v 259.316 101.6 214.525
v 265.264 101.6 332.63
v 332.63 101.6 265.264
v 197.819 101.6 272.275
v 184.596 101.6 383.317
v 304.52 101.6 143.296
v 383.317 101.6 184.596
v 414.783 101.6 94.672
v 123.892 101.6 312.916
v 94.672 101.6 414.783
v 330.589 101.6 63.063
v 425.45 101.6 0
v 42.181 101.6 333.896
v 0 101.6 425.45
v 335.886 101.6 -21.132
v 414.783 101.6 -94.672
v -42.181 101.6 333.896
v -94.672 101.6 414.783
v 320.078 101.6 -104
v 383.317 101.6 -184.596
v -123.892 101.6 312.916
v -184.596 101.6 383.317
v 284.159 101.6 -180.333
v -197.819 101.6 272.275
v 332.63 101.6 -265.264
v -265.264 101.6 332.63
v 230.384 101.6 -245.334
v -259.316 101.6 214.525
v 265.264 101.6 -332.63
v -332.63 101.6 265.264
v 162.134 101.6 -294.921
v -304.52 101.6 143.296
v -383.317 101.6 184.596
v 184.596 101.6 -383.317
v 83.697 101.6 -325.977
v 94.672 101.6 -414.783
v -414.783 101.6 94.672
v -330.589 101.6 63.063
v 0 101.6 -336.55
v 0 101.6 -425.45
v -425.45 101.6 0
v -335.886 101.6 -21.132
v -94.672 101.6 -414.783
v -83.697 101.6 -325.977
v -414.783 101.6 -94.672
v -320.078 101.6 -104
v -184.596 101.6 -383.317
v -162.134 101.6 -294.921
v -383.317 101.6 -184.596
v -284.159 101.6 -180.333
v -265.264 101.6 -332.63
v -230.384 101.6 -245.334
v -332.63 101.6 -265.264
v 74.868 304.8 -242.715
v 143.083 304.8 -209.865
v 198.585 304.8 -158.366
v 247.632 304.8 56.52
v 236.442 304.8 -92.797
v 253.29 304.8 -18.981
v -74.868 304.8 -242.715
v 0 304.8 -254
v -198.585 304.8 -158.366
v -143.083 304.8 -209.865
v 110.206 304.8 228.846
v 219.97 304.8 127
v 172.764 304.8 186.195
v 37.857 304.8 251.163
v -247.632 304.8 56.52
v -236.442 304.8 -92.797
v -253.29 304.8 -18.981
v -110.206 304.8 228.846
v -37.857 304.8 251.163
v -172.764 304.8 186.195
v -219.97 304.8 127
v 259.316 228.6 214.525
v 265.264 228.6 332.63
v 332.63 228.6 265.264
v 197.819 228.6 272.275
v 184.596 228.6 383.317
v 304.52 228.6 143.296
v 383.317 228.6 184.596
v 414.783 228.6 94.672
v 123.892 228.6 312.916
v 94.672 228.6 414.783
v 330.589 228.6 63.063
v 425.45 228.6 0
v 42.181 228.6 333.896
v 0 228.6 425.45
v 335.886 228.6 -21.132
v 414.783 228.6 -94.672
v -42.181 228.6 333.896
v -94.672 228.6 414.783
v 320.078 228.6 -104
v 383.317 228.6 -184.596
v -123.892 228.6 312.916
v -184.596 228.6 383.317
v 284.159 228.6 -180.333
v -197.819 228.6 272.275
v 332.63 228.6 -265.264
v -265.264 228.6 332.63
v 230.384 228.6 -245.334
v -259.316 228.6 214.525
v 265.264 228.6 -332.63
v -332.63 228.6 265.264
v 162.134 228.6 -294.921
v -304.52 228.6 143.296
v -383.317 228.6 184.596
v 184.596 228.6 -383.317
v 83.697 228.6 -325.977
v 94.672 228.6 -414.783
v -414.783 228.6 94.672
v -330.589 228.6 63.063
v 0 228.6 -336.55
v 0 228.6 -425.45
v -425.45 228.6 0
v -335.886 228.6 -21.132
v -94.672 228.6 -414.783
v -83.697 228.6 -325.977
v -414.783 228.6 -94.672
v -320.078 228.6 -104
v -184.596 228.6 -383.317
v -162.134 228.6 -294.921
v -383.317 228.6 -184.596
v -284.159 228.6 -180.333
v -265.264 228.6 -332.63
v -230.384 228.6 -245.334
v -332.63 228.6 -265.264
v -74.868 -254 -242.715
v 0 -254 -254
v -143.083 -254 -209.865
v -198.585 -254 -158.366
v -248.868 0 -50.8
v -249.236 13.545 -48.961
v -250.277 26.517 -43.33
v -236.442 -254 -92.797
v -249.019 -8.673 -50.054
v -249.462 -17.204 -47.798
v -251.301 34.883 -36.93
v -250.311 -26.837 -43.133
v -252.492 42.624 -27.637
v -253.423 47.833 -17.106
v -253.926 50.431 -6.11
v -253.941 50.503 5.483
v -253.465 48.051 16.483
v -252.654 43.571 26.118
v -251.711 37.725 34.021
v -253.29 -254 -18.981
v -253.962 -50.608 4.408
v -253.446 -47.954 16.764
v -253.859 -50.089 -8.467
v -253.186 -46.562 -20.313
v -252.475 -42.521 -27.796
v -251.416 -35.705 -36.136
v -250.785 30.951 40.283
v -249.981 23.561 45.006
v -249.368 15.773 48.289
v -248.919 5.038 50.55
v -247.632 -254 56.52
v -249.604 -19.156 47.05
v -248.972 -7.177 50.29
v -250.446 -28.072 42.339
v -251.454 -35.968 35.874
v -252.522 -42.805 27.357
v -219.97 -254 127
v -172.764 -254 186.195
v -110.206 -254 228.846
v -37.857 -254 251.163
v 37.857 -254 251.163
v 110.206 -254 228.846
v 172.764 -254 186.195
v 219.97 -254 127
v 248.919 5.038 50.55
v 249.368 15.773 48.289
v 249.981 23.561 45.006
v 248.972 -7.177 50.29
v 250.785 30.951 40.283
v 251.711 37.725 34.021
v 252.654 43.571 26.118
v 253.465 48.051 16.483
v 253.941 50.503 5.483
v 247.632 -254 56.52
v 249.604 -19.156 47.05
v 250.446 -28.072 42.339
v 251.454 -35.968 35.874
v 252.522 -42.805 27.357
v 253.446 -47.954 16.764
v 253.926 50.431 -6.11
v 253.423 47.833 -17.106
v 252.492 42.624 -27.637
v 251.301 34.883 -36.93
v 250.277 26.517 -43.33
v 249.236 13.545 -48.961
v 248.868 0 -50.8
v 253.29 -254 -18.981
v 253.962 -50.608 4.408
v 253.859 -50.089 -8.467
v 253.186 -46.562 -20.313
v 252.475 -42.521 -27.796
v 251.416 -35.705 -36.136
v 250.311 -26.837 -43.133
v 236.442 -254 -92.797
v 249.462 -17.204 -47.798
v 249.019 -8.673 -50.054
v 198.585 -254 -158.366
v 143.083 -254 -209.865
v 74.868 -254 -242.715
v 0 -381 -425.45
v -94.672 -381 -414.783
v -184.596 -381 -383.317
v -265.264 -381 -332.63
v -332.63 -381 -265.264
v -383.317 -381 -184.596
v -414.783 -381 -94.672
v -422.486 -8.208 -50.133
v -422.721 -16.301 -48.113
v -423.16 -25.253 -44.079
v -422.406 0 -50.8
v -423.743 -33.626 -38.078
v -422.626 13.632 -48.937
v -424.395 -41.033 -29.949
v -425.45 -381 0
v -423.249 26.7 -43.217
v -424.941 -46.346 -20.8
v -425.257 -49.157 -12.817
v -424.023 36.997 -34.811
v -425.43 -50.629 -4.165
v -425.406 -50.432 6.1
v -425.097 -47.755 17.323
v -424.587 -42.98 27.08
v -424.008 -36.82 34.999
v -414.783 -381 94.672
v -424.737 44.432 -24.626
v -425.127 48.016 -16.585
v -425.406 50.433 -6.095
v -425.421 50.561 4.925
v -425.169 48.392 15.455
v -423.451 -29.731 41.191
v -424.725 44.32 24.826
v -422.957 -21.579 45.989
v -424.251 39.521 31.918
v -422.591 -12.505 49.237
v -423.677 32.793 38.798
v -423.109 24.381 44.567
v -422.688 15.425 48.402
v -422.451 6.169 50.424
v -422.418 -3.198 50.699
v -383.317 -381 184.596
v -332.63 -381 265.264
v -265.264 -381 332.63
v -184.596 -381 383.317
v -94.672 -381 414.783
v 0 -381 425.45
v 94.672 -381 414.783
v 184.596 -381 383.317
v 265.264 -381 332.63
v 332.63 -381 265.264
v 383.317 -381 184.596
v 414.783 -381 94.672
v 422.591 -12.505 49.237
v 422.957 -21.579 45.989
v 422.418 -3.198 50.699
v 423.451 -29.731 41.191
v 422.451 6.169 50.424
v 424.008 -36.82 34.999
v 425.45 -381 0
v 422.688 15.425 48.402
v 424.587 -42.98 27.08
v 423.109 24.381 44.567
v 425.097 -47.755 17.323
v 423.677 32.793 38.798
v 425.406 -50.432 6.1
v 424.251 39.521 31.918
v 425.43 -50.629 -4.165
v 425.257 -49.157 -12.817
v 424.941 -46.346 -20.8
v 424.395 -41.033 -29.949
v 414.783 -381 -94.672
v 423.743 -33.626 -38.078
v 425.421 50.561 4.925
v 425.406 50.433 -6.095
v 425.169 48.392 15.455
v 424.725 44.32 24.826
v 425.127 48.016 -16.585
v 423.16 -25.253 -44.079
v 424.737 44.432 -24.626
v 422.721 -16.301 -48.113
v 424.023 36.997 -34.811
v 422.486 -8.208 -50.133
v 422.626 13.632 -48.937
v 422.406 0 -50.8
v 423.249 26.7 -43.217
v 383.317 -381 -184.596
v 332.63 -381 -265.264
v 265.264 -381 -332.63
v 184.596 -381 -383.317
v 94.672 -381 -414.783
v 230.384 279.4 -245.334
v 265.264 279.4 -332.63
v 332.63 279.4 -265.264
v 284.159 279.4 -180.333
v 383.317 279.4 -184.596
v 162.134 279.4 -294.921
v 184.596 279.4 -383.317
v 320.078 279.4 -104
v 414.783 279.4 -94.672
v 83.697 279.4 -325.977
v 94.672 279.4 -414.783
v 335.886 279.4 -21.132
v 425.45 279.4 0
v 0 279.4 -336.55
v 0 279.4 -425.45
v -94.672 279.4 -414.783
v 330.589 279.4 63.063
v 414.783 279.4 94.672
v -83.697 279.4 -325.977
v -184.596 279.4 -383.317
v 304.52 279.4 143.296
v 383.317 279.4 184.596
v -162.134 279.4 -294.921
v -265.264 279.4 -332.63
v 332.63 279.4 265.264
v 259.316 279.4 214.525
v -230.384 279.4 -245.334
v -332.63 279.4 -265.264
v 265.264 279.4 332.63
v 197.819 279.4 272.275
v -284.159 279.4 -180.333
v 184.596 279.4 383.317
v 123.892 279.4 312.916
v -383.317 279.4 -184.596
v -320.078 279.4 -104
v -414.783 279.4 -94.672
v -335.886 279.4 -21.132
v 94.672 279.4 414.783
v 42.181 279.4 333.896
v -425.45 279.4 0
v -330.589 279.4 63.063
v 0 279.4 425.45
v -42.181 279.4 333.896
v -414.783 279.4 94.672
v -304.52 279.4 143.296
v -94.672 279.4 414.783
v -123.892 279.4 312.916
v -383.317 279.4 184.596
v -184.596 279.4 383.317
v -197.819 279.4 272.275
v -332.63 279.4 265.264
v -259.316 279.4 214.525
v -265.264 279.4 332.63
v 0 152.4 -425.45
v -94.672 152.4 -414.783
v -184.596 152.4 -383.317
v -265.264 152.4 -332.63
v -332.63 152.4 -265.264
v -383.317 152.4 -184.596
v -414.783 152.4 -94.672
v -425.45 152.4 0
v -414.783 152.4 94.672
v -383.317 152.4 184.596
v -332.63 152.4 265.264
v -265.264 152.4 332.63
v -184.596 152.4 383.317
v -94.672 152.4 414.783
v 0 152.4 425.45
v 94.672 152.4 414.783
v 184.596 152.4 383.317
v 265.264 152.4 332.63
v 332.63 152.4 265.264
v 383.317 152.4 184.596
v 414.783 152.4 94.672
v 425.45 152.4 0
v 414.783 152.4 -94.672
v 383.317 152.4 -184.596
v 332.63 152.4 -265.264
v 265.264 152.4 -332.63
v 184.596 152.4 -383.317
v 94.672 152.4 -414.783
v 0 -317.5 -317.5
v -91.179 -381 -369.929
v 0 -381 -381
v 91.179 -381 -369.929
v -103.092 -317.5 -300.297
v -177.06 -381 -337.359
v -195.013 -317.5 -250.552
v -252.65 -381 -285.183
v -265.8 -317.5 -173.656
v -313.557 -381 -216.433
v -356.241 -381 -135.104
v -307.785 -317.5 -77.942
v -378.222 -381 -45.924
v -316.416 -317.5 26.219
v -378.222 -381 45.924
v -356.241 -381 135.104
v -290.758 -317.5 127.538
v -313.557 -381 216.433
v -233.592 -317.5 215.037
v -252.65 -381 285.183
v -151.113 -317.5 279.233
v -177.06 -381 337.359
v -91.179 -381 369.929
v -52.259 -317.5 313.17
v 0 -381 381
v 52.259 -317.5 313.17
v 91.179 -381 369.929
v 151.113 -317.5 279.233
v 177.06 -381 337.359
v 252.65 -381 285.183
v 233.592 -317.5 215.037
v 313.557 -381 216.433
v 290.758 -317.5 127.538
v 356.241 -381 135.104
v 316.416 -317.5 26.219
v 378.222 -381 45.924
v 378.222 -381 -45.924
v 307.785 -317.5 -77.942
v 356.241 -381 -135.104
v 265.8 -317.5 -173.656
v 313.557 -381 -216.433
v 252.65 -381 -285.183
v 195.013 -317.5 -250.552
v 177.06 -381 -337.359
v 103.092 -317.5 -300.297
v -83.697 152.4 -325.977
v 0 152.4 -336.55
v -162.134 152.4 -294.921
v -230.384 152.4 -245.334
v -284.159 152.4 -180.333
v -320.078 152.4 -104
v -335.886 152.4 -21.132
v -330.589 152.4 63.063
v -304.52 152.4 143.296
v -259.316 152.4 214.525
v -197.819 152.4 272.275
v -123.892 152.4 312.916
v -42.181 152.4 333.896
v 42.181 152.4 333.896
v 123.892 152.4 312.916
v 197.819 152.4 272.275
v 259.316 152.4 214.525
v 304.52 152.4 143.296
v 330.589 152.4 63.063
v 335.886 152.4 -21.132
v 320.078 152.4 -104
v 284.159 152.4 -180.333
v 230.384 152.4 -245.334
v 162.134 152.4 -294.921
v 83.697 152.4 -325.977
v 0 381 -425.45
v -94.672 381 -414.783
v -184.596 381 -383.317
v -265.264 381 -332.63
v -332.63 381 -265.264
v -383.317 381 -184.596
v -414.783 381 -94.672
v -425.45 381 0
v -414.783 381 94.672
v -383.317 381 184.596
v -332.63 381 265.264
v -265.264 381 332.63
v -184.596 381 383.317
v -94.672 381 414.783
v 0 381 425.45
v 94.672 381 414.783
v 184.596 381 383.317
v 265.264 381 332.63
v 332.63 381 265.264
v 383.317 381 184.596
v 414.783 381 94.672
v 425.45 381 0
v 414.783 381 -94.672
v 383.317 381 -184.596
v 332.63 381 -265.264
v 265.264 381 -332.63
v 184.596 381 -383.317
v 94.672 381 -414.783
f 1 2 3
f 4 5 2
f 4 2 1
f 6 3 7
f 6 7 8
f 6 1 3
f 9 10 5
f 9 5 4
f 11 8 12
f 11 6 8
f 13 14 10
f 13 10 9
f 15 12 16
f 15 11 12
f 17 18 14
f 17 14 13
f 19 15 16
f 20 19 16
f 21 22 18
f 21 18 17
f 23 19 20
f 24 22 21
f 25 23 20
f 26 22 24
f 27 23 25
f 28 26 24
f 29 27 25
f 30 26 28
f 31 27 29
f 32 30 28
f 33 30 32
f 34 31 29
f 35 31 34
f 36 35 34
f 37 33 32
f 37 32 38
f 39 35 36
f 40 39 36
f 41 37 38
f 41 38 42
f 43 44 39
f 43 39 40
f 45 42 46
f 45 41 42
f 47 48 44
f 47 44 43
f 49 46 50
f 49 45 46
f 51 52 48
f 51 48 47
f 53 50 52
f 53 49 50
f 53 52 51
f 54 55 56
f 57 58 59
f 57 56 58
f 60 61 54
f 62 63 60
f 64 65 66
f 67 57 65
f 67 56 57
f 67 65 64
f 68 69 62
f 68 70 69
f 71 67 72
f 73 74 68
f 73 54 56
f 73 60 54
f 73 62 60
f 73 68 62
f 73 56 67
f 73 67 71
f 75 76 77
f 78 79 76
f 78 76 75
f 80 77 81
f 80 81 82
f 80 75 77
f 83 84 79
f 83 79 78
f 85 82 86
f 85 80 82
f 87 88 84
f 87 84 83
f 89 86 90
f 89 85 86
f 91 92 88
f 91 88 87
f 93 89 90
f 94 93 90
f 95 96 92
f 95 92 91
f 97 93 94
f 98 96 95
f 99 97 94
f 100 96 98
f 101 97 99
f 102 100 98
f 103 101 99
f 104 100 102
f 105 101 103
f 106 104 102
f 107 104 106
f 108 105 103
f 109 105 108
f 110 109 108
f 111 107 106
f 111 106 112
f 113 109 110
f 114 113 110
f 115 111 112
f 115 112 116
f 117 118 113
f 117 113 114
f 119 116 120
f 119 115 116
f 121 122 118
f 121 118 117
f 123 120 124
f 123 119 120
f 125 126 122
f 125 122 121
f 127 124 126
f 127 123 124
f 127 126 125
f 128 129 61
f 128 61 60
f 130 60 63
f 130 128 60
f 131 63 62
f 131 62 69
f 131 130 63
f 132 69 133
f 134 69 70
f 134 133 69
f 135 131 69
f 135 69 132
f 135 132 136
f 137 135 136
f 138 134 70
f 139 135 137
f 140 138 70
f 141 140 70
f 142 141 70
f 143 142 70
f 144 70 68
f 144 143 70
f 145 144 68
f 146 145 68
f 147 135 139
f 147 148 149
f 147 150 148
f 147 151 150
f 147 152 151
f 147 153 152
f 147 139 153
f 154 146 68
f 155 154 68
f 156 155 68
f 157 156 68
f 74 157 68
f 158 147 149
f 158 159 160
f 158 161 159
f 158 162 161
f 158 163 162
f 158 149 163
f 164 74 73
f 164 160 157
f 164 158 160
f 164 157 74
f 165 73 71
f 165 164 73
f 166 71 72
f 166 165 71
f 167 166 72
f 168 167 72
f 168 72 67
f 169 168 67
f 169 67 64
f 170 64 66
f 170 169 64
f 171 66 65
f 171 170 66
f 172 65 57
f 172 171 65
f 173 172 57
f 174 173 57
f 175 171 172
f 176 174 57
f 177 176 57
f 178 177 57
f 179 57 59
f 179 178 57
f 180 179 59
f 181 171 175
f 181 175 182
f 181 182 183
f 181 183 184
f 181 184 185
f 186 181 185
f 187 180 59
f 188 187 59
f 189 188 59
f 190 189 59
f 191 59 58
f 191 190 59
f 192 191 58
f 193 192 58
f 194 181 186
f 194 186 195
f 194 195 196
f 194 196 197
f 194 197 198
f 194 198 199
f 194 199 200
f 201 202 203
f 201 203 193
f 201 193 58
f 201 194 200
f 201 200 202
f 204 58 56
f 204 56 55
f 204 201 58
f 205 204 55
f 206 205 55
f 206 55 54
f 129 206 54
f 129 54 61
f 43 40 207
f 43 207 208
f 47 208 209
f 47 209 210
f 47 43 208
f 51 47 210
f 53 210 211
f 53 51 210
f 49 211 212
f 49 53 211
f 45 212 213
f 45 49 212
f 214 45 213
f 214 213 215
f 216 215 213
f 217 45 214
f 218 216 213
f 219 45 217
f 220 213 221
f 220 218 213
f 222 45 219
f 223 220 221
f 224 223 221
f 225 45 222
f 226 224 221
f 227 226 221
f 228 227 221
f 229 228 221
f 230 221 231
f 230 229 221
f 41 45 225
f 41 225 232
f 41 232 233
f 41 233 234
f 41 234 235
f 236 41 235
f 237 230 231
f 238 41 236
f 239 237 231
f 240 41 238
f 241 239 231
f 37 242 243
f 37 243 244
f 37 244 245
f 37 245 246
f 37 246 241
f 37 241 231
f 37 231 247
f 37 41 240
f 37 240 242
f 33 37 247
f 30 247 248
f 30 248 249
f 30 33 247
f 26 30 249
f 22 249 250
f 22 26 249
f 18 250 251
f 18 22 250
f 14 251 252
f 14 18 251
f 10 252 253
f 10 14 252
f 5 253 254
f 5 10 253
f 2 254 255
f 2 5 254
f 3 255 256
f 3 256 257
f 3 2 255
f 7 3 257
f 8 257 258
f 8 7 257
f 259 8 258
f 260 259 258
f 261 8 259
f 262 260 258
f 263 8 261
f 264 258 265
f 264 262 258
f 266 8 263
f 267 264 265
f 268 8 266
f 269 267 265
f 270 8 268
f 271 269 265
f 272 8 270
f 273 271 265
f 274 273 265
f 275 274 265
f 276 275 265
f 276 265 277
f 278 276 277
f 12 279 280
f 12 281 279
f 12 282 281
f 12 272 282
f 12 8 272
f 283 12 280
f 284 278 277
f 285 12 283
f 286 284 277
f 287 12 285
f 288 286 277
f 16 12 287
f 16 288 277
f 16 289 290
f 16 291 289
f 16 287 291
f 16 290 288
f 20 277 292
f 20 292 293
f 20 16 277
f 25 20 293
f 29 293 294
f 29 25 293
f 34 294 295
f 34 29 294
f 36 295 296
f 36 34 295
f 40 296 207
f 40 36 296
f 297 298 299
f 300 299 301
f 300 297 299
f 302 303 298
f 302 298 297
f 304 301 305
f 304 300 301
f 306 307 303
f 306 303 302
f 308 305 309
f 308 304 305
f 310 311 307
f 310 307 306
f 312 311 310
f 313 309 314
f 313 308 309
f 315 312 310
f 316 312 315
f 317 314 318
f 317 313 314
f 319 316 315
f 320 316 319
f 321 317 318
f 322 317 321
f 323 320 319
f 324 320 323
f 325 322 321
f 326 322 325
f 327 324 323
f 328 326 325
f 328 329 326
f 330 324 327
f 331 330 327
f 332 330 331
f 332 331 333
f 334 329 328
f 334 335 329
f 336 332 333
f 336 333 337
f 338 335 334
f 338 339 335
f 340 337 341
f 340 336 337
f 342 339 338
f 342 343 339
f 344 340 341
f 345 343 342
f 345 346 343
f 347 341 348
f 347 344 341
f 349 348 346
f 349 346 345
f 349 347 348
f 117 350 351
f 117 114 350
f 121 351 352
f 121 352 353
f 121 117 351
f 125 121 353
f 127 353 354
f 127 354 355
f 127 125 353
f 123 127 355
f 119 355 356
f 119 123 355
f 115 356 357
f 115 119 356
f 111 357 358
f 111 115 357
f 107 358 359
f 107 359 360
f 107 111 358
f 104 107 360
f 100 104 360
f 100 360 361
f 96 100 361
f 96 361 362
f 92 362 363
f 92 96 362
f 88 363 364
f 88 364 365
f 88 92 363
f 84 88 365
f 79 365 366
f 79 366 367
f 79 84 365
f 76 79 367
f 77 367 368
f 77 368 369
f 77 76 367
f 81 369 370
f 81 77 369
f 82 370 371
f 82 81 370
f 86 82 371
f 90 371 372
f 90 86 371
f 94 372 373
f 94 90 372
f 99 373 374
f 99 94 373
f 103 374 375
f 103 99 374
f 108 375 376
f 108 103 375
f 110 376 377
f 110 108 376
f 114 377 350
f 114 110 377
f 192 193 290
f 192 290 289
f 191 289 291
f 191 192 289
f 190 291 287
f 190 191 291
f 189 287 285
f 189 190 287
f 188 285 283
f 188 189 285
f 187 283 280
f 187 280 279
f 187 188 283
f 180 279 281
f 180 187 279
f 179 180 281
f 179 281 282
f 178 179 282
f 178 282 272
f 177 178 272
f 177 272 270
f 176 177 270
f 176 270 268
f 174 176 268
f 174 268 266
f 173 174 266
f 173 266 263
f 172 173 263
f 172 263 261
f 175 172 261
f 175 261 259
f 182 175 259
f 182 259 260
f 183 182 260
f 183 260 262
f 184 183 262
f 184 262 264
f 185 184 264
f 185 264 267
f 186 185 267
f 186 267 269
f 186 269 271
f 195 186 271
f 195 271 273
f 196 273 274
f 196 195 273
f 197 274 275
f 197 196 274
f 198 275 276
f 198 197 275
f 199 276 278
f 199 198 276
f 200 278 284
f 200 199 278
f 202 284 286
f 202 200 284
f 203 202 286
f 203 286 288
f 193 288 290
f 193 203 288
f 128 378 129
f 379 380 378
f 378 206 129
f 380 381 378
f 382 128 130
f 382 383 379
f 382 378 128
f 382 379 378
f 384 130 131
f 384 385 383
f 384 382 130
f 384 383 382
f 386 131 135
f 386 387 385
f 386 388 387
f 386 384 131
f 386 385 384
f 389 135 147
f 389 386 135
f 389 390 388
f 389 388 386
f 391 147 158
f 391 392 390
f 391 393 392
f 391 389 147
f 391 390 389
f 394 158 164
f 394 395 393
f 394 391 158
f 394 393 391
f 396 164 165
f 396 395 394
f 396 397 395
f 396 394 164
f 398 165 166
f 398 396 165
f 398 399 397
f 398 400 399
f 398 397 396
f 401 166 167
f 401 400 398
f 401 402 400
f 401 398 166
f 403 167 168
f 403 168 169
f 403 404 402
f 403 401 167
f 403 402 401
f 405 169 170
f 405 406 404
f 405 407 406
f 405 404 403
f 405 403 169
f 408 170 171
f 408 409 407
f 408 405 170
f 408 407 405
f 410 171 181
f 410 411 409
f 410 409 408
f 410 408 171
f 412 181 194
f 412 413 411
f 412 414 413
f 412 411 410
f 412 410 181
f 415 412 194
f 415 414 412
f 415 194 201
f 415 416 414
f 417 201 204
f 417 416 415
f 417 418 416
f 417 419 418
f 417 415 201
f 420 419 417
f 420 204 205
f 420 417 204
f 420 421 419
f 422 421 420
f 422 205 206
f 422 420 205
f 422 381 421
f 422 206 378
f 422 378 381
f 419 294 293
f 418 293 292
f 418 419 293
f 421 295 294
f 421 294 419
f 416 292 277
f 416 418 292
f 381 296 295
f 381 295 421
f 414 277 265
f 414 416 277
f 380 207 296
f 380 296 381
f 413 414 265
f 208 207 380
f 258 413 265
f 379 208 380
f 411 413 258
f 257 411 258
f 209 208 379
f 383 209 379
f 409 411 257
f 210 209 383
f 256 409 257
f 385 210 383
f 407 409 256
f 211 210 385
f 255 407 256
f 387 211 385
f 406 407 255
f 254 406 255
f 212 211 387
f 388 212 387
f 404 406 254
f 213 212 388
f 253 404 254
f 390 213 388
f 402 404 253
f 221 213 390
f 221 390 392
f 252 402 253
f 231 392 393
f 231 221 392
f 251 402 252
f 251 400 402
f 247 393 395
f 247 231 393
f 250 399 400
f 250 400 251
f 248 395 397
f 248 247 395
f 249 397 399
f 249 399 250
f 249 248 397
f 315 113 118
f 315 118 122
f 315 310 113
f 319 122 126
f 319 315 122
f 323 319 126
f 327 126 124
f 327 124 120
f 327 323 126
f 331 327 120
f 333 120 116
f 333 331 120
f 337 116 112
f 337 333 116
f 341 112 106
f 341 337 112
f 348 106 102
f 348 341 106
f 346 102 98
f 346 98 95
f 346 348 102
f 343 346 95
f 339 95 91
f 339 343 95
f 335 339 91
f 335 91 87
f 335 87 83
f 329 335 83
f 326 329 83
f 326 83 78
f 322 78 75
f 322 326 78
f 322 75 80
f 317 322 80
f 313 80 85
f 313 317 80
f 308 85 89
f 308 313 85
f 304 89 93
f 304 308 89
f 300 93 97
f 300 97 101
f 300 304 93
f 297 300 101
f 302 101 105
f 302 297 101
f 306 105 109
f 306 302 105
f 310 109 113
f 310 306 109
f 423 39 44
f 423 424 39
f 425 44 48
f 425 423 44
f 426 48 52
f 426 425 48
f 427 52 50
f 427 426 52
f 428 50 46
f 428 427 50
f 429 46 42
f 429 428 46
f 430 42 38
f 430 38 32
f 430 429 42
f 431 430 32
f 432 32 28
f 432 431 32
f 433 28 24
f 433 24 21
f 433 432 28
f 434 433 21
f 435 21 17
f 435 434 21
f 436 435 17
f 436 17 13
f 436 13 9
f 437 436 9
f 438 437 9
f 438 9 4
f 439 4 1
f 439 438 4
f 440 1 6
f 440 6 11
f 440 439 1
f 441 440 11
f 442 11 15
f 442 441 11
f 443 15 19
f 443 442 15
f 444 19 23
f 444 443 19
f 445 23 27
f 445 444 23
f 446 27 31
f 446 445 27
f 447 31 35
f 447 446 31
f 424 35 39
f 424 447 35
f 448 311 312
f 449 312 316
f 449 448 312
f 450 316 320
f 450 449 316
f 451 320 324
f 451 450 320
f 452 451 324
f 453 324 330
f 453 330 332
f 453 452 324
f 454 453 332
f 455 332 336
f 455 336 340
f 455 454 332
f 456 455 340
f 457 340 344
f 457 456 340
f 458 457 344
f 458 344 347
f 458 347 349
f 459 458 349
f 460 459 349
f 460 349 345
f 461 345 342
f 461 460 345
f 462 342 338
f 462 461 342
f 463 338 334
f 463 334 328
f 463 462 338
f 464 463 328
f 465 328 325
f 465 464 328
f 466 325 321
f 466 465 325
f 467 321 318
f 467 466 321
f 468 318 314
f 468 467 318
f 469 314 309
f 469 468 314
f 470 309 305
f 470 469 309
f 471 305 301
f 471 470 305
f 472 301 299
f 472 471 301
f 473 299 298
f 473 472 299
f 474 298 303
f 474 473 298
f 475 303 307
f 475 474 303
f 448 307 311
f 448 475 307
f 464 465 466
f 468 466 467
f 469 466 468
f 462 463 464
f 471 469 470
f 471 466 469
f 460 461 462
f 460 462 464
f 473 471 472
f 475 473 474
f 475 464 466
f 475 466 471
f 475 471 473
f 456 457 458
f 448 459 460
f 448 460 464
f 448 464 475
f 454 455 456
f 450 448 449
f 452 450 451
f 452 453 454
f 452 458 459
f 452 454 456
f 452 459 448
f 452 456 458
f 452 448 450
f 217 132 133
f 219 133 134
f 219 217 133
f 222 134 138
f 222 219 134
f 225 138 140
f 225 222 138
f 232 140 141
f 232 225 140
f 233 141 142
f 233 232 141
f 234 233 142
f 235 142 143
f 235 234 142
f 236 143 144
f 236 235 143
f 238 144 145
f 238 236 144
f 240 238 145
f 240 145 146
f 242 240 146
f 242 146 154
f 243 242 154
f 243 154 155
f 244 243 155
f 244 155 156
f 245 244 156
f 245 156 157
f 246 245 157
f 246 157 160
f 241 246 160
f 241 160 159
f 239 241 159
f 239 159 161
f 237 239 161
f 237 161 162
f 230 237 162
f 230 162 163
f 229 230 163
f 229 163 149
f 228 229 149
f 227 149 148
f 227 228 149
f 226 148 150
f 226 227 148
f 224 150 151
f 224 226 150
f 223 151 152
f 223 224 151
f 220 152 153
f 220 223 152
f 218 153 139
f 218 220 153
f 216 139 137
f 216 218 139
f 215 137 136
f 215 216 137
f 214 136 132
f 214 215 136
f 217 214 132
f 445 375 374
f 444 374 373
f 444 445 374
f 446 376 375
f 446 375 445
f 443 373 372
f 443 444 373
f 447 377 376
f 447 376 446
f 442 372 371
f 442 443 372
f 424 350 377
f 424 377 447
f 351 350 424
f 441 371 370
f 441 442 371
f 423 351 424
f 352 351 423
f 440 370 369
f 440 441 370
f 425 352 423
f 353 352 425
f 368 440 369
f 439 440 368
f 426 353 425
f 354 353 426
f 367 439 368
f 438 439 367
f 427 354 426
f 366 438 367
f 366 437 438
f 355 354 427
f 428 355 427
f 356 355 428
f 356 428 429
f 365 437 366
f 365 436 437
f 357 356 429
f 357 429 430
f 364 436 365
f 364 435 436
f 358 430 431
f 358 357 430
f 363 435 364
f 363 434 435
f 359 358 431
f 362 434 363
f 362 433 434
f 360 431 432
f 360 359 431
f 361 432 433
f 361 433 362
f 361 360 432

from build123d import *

# Parameters (mm, degrees)
CUT_EXTRUDE1_DEPTH      = 713.163187058
CUT_EXTRUDE1_DEPTH_BACK = 713.163187058
SKETCH4_R               = 50.8


with BuildPart() as part:
    # Sketch3 → Revolve1 (revolve)
    with BuildSketch(Plane.XY, mode=Mode.PRIVATE) as revolve1_sk:
        Polygon((0, 381), (0, 304.8), (-254, 304.8), (-254, -254), (-381, -381), (-425.45, -381), (-425.45, 101.6), (-336.55, 101.6), (-336.55, 152.4), (-425.45, 152.4), (-425.45, 228.6), (-336.55, 228.6), (-336.55, 279.4), (-425.45, 279.4), (-425.45, 381), align=None)
    revolve(revolve1_sk.sketch.rotate(Axis((0, -381, 0), (0, 1, 0)), 270), axis=Axis((0, -381, 0), (0, 1, 0)))

    # Sketch4 → Cut-Extrude1 (cut, two sides: drawn at the far end of the back side and taken through both)
    with BuildSketch(Plane(origin=(0, 0, 0), x_dir=(0, 0, -1), z_dir=(1, 0, 0)).offset(-CUT_EXTRUDE1_DEPTH_BACK)):
        Circle(SKETCH4_R)
    extrude(amount=CUT_EXTRUDE1_DEPTH + CUT_EXTRUDE1_DEPTH_BACK, mode=Mode.SUBTRACT)


solid = part.part
